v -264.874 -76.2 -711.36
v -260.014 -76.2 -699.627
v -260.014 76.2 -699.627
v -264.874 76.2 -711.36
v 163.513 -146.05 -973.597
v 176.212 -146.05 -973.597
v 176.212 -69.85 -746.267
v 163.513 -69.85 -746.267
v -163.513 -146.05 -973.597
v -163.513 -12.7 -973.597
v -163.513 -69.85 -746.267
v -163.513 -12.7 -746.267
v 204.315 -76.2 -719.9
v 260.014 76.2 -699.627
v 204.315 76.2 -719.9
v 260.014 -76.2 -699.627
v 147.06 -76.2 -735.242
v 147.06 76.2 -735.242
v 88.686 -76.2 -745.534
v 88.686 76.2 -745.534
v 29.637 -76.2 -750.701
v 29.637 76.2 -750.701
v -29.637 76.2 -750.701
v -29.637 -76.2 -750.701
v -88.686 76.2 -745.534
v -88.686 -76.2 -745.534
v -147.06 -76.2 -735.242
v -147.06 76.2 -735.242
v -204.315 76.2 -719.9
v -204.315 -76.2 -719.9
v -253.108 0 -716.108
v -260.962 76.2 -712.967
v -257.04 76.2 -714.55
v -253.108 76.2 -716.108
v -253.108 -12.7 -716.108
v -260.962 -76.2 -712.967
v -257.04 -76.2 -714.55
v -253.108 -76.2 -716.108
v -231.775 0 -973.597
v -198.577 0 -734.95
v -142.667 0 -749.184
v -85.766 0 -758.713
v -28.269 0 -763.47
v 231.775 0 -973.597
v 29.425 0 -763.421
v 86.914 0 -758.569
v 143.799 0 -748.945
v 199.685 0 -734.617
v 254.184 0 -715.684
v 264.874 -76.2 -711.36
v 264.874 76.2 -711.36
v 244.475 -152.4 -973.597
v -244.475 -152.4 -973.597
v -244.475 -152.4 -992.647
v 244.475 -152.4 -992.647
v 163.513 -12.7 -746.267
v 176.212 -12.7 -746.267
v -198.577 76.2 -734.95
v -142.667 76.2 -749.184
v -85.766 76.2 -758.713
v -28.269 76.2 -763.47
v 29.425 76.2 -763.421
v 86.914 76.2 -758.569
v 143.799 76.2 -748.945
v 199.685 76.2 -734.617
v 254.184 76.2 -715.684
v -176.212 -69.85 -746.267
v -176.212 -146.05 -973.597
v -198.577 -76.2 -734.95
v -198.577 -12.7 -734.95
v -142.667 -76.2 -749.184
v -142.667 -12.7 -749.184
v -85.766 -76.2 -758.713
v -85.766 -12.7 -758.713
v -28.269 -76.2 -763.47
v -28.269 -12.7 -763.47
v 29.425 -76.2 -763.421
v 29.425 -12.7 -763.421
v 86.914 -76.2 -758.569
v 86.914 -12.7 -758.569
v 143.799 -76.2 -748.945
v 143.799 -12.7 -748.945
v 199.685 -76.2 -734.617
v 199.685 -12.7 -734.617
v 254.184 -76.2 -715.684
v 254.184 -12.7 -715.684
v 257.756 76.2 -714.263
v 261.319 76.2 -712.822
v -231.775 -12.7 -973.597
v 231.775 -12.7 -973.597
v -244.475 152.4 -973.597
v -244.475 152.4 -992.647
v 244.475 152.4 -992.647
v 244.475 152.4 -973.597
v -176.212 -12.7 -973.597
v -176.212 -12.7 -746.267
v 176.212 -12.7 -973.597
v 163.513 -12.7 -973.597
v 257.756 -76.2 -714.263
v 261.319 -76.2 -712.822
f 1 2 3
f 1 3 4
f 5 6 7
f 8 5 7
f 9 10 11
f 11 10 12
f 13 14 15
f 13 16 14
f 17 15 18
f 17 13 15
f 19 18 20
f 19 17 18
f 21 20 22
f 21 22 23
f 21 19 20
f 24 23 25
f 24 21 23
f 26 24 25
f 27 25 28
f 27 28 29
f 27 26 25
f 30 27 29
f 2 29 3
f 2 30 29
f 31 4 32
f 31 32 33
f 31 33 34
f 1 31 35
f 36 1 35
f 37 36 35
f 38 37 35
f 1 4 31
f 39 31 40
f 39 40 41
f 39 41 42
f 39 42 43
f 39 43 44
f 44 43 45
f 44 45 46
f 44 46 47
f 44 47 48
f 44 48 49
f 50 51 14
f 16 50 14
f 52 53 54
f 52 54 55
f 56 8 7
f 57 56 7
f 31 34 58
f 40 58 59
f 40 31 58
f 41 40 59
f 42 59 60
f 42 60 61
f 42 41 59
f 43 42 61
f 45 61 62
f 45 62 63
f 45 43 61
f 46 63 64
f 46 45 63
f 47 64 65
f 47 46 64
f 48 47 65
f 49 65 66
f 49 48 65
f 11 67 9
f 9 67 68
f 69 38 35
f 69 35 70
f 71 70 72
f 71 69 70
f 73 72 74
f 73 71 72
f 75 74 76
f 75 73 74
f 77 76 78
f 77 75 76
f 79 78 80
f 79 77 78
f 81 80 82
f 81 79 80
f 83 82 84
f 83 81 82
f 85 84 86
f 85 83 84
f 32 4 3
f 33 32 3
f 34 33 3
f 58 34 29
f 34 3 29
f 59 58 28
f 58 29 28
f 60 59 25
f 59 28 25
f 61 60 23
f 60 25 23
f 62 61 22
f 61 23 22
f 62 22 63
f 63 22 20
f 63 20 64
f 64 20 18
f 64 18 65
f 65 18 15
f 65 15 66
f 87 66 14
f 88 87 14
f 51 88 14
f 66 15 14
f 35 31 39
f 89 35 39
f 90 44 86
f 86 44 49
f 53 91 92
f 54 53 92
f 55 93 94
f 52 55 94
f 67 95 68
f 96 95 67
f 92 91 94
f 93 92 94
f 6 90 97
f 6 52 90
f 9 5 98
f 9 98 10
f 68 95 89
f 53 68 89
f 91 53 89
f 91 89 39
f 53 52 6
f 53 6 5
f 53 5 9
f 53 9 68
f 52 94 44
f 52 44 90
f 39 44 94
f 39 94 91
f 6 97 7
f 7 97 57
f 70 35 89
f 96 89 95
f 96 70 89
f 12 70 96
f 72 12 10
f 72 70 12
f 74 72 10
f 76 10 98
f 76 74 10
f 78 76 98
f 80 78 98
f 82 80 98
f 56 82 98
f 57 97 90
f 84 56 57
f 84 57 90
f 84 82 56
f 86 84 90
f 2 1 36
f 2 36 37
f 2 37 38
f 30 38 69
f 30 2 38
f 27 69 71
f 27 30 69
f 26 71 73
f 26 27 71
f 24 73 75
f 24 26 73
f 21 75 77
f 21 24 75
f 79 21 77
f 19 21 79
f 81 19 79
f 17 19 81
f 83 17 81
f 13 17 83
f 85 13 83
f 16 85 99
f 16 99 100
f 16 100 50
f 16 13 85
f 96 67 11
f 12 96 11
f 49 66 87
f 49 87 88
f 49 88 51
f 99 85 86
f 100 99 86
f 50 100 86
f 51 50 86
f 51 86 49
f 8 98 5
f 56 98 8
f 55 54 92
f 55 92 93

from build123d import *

# Parameters (mm, degrees)
F1_DEPTH  = 152.4
F2_DEPTH  = 12.7
F3_DEPTH  = 76.2
F4_W      = 12.7
F4_H      = 227.33
F5_DEPTH  = 25.4
F6_DEPTH  = 133.35
F8_DEPTH  = 12.7
F10_DEPTH = 12.7


with BuildPart() as f1:
    # F0 (on Front) → F1 (new body, symmetric)
    with BuildSketch(Plane.XZ):
        Polygon((231.775, -973.5972180367), (-231.775, -973.5972180367), (-244.475, -973.5972180367), (-244.475, -992.6472180367), (244.475, -992.6472180367), (244.475, -973.5972180367), align=None)
    extrude(amount=F1_DEPTH, both=True)

    # F0 (on Front) → F2 (join)
    with BuildSketch(Plane.XZ):
        with BuildLine():
            ThreePointArc((260.0142581205, -699.6271664014), (0, -751.3472180367), (-260.0142581205, -699.6271664014))
            Line((-260.0142581205, -699.6271664014), (-264.8743377115, -711.3604364643))
            ThreePointArc((-264.8743377115, -711.3604364643), (-259.0018869142, -713.7614132329), (-253.1076754433, -716.1084622195))
            ThreePointArc((-253.1076754433, -716.1084622195), (0.5785166895, -764.0469762671), (254.1842179232, -715.6844545199))
            ThreePointArc((254.1842179232, -715.6844545199), (259.5382829708, -713.5447086205), (264.8743377115, -711.3604364643))
            Line((264.8743377115, -711.3604364643), (260.0142581205, -699.6271664014))
        make_face()
        with BuildLine():
            ThreePointArc((254.1842179232, -715.6844545199), (0.5785166895, -764.0469762671), (-253.1076754433, -716.1084622195))
            Line((-253.1076754433, -716.1084622195), (-231.775, -973.5972180367))
            Line((-231.775, -973.5972180367), (231.775, -973.5972180367))
            Line((231.775, -973.5972180367), (254.1842179232, -715.6844545199))
        make_face()
        Polygon((231.775, -973.5972180367), (-231.775, -973.5972180367), (-244.475, -973.5972180367), (-244.475, -992.6472180367), (244.475, -992.6472180367), (244.475, -973.5972180367), align=None)
    extrude(amount=F2_DEPTH)

    # F0 (on Front) → F3 (join, symmetric)
    with BuildSketch(Plane.XZ):
        with BuildLine():
            ThreePointArc((260.0142581205, -699.6271664014), (0, -751.3472180367), (-260.0142581205, -699.6271664014))
            Line((-260.0142581205, -699.6271664014), (-264.8743377115, -711.3604364643))
            ThreePointArc((-264.8743377115, -711.3604364643), (-259.0018869142, -713.7614132329), (-253.1076754433, -716.1084622195))
            ThreePointArc((-253.1076754433, -716.1084622195), (0.5785166895, -764.0469762671), (254.1842179232, -715.6844545199))
            ThreePointArc((254.1842179232, -715.6844545199), (259.5382829708, -713.5447086205), (264.8743377115, -711.3604364643))
            Line((264.8743377115, -711.3604364643), (260.0142581205, -699.6271664014))
        make_face()
    extrude(amount=F3_DEPTH, both=True)

    # F4 (on face) → F5 (join)
    with BuildSketch(Plane.XZ.offset(12.7)):
        with Locations((-169.8625, -859.9322180367)):
            Rectangle(F4_W, F4_H)
        with Locations((169.8625, -859.9322180367)):
            Rectangle(F4_W, F4_H)
    extrude(amount=F5_DEPTH)

    # F4 (on face) → F6 (join)
    with BuildSketch(Plane.XZ.offset(12.7)):
        with Locations((-169.8625, -859.9322180367)):
            Rectangle(F4_W, F4_H)
        with Locations((169.8625, -859.9322180367)):
            Rectangle(F4_W, F4_H)
    extrude(amount=F6_DEPTH)

    # F7 (on face) → F8 (cut)
    with BuildSketch(Plane(origin=(-176.2125, 0, 0), x_dir=(0, -1, 0), z_dir=(-1, 0, 0))):
        Polygon((146.05, -746.2672180367), (69.85, -746.2672180367), (146.05, -973.5972180367), align=None)
    extrude(amount=-F8_DEPTH, mode=Mode.SUBTRACT)

    # F9 (on face) → F10 (cut)
    with BuildSketch(Plane.YZ.offset(176.2125)):
        Polygon((-146.05, -973.5972180367), (-69.85, -746.2672180367), (-146.05, -746.2672180367), align=None)
    extrude(amount=-F10_DEPTH, mode=Mode.SUBTRACT)


solid = f1.part
